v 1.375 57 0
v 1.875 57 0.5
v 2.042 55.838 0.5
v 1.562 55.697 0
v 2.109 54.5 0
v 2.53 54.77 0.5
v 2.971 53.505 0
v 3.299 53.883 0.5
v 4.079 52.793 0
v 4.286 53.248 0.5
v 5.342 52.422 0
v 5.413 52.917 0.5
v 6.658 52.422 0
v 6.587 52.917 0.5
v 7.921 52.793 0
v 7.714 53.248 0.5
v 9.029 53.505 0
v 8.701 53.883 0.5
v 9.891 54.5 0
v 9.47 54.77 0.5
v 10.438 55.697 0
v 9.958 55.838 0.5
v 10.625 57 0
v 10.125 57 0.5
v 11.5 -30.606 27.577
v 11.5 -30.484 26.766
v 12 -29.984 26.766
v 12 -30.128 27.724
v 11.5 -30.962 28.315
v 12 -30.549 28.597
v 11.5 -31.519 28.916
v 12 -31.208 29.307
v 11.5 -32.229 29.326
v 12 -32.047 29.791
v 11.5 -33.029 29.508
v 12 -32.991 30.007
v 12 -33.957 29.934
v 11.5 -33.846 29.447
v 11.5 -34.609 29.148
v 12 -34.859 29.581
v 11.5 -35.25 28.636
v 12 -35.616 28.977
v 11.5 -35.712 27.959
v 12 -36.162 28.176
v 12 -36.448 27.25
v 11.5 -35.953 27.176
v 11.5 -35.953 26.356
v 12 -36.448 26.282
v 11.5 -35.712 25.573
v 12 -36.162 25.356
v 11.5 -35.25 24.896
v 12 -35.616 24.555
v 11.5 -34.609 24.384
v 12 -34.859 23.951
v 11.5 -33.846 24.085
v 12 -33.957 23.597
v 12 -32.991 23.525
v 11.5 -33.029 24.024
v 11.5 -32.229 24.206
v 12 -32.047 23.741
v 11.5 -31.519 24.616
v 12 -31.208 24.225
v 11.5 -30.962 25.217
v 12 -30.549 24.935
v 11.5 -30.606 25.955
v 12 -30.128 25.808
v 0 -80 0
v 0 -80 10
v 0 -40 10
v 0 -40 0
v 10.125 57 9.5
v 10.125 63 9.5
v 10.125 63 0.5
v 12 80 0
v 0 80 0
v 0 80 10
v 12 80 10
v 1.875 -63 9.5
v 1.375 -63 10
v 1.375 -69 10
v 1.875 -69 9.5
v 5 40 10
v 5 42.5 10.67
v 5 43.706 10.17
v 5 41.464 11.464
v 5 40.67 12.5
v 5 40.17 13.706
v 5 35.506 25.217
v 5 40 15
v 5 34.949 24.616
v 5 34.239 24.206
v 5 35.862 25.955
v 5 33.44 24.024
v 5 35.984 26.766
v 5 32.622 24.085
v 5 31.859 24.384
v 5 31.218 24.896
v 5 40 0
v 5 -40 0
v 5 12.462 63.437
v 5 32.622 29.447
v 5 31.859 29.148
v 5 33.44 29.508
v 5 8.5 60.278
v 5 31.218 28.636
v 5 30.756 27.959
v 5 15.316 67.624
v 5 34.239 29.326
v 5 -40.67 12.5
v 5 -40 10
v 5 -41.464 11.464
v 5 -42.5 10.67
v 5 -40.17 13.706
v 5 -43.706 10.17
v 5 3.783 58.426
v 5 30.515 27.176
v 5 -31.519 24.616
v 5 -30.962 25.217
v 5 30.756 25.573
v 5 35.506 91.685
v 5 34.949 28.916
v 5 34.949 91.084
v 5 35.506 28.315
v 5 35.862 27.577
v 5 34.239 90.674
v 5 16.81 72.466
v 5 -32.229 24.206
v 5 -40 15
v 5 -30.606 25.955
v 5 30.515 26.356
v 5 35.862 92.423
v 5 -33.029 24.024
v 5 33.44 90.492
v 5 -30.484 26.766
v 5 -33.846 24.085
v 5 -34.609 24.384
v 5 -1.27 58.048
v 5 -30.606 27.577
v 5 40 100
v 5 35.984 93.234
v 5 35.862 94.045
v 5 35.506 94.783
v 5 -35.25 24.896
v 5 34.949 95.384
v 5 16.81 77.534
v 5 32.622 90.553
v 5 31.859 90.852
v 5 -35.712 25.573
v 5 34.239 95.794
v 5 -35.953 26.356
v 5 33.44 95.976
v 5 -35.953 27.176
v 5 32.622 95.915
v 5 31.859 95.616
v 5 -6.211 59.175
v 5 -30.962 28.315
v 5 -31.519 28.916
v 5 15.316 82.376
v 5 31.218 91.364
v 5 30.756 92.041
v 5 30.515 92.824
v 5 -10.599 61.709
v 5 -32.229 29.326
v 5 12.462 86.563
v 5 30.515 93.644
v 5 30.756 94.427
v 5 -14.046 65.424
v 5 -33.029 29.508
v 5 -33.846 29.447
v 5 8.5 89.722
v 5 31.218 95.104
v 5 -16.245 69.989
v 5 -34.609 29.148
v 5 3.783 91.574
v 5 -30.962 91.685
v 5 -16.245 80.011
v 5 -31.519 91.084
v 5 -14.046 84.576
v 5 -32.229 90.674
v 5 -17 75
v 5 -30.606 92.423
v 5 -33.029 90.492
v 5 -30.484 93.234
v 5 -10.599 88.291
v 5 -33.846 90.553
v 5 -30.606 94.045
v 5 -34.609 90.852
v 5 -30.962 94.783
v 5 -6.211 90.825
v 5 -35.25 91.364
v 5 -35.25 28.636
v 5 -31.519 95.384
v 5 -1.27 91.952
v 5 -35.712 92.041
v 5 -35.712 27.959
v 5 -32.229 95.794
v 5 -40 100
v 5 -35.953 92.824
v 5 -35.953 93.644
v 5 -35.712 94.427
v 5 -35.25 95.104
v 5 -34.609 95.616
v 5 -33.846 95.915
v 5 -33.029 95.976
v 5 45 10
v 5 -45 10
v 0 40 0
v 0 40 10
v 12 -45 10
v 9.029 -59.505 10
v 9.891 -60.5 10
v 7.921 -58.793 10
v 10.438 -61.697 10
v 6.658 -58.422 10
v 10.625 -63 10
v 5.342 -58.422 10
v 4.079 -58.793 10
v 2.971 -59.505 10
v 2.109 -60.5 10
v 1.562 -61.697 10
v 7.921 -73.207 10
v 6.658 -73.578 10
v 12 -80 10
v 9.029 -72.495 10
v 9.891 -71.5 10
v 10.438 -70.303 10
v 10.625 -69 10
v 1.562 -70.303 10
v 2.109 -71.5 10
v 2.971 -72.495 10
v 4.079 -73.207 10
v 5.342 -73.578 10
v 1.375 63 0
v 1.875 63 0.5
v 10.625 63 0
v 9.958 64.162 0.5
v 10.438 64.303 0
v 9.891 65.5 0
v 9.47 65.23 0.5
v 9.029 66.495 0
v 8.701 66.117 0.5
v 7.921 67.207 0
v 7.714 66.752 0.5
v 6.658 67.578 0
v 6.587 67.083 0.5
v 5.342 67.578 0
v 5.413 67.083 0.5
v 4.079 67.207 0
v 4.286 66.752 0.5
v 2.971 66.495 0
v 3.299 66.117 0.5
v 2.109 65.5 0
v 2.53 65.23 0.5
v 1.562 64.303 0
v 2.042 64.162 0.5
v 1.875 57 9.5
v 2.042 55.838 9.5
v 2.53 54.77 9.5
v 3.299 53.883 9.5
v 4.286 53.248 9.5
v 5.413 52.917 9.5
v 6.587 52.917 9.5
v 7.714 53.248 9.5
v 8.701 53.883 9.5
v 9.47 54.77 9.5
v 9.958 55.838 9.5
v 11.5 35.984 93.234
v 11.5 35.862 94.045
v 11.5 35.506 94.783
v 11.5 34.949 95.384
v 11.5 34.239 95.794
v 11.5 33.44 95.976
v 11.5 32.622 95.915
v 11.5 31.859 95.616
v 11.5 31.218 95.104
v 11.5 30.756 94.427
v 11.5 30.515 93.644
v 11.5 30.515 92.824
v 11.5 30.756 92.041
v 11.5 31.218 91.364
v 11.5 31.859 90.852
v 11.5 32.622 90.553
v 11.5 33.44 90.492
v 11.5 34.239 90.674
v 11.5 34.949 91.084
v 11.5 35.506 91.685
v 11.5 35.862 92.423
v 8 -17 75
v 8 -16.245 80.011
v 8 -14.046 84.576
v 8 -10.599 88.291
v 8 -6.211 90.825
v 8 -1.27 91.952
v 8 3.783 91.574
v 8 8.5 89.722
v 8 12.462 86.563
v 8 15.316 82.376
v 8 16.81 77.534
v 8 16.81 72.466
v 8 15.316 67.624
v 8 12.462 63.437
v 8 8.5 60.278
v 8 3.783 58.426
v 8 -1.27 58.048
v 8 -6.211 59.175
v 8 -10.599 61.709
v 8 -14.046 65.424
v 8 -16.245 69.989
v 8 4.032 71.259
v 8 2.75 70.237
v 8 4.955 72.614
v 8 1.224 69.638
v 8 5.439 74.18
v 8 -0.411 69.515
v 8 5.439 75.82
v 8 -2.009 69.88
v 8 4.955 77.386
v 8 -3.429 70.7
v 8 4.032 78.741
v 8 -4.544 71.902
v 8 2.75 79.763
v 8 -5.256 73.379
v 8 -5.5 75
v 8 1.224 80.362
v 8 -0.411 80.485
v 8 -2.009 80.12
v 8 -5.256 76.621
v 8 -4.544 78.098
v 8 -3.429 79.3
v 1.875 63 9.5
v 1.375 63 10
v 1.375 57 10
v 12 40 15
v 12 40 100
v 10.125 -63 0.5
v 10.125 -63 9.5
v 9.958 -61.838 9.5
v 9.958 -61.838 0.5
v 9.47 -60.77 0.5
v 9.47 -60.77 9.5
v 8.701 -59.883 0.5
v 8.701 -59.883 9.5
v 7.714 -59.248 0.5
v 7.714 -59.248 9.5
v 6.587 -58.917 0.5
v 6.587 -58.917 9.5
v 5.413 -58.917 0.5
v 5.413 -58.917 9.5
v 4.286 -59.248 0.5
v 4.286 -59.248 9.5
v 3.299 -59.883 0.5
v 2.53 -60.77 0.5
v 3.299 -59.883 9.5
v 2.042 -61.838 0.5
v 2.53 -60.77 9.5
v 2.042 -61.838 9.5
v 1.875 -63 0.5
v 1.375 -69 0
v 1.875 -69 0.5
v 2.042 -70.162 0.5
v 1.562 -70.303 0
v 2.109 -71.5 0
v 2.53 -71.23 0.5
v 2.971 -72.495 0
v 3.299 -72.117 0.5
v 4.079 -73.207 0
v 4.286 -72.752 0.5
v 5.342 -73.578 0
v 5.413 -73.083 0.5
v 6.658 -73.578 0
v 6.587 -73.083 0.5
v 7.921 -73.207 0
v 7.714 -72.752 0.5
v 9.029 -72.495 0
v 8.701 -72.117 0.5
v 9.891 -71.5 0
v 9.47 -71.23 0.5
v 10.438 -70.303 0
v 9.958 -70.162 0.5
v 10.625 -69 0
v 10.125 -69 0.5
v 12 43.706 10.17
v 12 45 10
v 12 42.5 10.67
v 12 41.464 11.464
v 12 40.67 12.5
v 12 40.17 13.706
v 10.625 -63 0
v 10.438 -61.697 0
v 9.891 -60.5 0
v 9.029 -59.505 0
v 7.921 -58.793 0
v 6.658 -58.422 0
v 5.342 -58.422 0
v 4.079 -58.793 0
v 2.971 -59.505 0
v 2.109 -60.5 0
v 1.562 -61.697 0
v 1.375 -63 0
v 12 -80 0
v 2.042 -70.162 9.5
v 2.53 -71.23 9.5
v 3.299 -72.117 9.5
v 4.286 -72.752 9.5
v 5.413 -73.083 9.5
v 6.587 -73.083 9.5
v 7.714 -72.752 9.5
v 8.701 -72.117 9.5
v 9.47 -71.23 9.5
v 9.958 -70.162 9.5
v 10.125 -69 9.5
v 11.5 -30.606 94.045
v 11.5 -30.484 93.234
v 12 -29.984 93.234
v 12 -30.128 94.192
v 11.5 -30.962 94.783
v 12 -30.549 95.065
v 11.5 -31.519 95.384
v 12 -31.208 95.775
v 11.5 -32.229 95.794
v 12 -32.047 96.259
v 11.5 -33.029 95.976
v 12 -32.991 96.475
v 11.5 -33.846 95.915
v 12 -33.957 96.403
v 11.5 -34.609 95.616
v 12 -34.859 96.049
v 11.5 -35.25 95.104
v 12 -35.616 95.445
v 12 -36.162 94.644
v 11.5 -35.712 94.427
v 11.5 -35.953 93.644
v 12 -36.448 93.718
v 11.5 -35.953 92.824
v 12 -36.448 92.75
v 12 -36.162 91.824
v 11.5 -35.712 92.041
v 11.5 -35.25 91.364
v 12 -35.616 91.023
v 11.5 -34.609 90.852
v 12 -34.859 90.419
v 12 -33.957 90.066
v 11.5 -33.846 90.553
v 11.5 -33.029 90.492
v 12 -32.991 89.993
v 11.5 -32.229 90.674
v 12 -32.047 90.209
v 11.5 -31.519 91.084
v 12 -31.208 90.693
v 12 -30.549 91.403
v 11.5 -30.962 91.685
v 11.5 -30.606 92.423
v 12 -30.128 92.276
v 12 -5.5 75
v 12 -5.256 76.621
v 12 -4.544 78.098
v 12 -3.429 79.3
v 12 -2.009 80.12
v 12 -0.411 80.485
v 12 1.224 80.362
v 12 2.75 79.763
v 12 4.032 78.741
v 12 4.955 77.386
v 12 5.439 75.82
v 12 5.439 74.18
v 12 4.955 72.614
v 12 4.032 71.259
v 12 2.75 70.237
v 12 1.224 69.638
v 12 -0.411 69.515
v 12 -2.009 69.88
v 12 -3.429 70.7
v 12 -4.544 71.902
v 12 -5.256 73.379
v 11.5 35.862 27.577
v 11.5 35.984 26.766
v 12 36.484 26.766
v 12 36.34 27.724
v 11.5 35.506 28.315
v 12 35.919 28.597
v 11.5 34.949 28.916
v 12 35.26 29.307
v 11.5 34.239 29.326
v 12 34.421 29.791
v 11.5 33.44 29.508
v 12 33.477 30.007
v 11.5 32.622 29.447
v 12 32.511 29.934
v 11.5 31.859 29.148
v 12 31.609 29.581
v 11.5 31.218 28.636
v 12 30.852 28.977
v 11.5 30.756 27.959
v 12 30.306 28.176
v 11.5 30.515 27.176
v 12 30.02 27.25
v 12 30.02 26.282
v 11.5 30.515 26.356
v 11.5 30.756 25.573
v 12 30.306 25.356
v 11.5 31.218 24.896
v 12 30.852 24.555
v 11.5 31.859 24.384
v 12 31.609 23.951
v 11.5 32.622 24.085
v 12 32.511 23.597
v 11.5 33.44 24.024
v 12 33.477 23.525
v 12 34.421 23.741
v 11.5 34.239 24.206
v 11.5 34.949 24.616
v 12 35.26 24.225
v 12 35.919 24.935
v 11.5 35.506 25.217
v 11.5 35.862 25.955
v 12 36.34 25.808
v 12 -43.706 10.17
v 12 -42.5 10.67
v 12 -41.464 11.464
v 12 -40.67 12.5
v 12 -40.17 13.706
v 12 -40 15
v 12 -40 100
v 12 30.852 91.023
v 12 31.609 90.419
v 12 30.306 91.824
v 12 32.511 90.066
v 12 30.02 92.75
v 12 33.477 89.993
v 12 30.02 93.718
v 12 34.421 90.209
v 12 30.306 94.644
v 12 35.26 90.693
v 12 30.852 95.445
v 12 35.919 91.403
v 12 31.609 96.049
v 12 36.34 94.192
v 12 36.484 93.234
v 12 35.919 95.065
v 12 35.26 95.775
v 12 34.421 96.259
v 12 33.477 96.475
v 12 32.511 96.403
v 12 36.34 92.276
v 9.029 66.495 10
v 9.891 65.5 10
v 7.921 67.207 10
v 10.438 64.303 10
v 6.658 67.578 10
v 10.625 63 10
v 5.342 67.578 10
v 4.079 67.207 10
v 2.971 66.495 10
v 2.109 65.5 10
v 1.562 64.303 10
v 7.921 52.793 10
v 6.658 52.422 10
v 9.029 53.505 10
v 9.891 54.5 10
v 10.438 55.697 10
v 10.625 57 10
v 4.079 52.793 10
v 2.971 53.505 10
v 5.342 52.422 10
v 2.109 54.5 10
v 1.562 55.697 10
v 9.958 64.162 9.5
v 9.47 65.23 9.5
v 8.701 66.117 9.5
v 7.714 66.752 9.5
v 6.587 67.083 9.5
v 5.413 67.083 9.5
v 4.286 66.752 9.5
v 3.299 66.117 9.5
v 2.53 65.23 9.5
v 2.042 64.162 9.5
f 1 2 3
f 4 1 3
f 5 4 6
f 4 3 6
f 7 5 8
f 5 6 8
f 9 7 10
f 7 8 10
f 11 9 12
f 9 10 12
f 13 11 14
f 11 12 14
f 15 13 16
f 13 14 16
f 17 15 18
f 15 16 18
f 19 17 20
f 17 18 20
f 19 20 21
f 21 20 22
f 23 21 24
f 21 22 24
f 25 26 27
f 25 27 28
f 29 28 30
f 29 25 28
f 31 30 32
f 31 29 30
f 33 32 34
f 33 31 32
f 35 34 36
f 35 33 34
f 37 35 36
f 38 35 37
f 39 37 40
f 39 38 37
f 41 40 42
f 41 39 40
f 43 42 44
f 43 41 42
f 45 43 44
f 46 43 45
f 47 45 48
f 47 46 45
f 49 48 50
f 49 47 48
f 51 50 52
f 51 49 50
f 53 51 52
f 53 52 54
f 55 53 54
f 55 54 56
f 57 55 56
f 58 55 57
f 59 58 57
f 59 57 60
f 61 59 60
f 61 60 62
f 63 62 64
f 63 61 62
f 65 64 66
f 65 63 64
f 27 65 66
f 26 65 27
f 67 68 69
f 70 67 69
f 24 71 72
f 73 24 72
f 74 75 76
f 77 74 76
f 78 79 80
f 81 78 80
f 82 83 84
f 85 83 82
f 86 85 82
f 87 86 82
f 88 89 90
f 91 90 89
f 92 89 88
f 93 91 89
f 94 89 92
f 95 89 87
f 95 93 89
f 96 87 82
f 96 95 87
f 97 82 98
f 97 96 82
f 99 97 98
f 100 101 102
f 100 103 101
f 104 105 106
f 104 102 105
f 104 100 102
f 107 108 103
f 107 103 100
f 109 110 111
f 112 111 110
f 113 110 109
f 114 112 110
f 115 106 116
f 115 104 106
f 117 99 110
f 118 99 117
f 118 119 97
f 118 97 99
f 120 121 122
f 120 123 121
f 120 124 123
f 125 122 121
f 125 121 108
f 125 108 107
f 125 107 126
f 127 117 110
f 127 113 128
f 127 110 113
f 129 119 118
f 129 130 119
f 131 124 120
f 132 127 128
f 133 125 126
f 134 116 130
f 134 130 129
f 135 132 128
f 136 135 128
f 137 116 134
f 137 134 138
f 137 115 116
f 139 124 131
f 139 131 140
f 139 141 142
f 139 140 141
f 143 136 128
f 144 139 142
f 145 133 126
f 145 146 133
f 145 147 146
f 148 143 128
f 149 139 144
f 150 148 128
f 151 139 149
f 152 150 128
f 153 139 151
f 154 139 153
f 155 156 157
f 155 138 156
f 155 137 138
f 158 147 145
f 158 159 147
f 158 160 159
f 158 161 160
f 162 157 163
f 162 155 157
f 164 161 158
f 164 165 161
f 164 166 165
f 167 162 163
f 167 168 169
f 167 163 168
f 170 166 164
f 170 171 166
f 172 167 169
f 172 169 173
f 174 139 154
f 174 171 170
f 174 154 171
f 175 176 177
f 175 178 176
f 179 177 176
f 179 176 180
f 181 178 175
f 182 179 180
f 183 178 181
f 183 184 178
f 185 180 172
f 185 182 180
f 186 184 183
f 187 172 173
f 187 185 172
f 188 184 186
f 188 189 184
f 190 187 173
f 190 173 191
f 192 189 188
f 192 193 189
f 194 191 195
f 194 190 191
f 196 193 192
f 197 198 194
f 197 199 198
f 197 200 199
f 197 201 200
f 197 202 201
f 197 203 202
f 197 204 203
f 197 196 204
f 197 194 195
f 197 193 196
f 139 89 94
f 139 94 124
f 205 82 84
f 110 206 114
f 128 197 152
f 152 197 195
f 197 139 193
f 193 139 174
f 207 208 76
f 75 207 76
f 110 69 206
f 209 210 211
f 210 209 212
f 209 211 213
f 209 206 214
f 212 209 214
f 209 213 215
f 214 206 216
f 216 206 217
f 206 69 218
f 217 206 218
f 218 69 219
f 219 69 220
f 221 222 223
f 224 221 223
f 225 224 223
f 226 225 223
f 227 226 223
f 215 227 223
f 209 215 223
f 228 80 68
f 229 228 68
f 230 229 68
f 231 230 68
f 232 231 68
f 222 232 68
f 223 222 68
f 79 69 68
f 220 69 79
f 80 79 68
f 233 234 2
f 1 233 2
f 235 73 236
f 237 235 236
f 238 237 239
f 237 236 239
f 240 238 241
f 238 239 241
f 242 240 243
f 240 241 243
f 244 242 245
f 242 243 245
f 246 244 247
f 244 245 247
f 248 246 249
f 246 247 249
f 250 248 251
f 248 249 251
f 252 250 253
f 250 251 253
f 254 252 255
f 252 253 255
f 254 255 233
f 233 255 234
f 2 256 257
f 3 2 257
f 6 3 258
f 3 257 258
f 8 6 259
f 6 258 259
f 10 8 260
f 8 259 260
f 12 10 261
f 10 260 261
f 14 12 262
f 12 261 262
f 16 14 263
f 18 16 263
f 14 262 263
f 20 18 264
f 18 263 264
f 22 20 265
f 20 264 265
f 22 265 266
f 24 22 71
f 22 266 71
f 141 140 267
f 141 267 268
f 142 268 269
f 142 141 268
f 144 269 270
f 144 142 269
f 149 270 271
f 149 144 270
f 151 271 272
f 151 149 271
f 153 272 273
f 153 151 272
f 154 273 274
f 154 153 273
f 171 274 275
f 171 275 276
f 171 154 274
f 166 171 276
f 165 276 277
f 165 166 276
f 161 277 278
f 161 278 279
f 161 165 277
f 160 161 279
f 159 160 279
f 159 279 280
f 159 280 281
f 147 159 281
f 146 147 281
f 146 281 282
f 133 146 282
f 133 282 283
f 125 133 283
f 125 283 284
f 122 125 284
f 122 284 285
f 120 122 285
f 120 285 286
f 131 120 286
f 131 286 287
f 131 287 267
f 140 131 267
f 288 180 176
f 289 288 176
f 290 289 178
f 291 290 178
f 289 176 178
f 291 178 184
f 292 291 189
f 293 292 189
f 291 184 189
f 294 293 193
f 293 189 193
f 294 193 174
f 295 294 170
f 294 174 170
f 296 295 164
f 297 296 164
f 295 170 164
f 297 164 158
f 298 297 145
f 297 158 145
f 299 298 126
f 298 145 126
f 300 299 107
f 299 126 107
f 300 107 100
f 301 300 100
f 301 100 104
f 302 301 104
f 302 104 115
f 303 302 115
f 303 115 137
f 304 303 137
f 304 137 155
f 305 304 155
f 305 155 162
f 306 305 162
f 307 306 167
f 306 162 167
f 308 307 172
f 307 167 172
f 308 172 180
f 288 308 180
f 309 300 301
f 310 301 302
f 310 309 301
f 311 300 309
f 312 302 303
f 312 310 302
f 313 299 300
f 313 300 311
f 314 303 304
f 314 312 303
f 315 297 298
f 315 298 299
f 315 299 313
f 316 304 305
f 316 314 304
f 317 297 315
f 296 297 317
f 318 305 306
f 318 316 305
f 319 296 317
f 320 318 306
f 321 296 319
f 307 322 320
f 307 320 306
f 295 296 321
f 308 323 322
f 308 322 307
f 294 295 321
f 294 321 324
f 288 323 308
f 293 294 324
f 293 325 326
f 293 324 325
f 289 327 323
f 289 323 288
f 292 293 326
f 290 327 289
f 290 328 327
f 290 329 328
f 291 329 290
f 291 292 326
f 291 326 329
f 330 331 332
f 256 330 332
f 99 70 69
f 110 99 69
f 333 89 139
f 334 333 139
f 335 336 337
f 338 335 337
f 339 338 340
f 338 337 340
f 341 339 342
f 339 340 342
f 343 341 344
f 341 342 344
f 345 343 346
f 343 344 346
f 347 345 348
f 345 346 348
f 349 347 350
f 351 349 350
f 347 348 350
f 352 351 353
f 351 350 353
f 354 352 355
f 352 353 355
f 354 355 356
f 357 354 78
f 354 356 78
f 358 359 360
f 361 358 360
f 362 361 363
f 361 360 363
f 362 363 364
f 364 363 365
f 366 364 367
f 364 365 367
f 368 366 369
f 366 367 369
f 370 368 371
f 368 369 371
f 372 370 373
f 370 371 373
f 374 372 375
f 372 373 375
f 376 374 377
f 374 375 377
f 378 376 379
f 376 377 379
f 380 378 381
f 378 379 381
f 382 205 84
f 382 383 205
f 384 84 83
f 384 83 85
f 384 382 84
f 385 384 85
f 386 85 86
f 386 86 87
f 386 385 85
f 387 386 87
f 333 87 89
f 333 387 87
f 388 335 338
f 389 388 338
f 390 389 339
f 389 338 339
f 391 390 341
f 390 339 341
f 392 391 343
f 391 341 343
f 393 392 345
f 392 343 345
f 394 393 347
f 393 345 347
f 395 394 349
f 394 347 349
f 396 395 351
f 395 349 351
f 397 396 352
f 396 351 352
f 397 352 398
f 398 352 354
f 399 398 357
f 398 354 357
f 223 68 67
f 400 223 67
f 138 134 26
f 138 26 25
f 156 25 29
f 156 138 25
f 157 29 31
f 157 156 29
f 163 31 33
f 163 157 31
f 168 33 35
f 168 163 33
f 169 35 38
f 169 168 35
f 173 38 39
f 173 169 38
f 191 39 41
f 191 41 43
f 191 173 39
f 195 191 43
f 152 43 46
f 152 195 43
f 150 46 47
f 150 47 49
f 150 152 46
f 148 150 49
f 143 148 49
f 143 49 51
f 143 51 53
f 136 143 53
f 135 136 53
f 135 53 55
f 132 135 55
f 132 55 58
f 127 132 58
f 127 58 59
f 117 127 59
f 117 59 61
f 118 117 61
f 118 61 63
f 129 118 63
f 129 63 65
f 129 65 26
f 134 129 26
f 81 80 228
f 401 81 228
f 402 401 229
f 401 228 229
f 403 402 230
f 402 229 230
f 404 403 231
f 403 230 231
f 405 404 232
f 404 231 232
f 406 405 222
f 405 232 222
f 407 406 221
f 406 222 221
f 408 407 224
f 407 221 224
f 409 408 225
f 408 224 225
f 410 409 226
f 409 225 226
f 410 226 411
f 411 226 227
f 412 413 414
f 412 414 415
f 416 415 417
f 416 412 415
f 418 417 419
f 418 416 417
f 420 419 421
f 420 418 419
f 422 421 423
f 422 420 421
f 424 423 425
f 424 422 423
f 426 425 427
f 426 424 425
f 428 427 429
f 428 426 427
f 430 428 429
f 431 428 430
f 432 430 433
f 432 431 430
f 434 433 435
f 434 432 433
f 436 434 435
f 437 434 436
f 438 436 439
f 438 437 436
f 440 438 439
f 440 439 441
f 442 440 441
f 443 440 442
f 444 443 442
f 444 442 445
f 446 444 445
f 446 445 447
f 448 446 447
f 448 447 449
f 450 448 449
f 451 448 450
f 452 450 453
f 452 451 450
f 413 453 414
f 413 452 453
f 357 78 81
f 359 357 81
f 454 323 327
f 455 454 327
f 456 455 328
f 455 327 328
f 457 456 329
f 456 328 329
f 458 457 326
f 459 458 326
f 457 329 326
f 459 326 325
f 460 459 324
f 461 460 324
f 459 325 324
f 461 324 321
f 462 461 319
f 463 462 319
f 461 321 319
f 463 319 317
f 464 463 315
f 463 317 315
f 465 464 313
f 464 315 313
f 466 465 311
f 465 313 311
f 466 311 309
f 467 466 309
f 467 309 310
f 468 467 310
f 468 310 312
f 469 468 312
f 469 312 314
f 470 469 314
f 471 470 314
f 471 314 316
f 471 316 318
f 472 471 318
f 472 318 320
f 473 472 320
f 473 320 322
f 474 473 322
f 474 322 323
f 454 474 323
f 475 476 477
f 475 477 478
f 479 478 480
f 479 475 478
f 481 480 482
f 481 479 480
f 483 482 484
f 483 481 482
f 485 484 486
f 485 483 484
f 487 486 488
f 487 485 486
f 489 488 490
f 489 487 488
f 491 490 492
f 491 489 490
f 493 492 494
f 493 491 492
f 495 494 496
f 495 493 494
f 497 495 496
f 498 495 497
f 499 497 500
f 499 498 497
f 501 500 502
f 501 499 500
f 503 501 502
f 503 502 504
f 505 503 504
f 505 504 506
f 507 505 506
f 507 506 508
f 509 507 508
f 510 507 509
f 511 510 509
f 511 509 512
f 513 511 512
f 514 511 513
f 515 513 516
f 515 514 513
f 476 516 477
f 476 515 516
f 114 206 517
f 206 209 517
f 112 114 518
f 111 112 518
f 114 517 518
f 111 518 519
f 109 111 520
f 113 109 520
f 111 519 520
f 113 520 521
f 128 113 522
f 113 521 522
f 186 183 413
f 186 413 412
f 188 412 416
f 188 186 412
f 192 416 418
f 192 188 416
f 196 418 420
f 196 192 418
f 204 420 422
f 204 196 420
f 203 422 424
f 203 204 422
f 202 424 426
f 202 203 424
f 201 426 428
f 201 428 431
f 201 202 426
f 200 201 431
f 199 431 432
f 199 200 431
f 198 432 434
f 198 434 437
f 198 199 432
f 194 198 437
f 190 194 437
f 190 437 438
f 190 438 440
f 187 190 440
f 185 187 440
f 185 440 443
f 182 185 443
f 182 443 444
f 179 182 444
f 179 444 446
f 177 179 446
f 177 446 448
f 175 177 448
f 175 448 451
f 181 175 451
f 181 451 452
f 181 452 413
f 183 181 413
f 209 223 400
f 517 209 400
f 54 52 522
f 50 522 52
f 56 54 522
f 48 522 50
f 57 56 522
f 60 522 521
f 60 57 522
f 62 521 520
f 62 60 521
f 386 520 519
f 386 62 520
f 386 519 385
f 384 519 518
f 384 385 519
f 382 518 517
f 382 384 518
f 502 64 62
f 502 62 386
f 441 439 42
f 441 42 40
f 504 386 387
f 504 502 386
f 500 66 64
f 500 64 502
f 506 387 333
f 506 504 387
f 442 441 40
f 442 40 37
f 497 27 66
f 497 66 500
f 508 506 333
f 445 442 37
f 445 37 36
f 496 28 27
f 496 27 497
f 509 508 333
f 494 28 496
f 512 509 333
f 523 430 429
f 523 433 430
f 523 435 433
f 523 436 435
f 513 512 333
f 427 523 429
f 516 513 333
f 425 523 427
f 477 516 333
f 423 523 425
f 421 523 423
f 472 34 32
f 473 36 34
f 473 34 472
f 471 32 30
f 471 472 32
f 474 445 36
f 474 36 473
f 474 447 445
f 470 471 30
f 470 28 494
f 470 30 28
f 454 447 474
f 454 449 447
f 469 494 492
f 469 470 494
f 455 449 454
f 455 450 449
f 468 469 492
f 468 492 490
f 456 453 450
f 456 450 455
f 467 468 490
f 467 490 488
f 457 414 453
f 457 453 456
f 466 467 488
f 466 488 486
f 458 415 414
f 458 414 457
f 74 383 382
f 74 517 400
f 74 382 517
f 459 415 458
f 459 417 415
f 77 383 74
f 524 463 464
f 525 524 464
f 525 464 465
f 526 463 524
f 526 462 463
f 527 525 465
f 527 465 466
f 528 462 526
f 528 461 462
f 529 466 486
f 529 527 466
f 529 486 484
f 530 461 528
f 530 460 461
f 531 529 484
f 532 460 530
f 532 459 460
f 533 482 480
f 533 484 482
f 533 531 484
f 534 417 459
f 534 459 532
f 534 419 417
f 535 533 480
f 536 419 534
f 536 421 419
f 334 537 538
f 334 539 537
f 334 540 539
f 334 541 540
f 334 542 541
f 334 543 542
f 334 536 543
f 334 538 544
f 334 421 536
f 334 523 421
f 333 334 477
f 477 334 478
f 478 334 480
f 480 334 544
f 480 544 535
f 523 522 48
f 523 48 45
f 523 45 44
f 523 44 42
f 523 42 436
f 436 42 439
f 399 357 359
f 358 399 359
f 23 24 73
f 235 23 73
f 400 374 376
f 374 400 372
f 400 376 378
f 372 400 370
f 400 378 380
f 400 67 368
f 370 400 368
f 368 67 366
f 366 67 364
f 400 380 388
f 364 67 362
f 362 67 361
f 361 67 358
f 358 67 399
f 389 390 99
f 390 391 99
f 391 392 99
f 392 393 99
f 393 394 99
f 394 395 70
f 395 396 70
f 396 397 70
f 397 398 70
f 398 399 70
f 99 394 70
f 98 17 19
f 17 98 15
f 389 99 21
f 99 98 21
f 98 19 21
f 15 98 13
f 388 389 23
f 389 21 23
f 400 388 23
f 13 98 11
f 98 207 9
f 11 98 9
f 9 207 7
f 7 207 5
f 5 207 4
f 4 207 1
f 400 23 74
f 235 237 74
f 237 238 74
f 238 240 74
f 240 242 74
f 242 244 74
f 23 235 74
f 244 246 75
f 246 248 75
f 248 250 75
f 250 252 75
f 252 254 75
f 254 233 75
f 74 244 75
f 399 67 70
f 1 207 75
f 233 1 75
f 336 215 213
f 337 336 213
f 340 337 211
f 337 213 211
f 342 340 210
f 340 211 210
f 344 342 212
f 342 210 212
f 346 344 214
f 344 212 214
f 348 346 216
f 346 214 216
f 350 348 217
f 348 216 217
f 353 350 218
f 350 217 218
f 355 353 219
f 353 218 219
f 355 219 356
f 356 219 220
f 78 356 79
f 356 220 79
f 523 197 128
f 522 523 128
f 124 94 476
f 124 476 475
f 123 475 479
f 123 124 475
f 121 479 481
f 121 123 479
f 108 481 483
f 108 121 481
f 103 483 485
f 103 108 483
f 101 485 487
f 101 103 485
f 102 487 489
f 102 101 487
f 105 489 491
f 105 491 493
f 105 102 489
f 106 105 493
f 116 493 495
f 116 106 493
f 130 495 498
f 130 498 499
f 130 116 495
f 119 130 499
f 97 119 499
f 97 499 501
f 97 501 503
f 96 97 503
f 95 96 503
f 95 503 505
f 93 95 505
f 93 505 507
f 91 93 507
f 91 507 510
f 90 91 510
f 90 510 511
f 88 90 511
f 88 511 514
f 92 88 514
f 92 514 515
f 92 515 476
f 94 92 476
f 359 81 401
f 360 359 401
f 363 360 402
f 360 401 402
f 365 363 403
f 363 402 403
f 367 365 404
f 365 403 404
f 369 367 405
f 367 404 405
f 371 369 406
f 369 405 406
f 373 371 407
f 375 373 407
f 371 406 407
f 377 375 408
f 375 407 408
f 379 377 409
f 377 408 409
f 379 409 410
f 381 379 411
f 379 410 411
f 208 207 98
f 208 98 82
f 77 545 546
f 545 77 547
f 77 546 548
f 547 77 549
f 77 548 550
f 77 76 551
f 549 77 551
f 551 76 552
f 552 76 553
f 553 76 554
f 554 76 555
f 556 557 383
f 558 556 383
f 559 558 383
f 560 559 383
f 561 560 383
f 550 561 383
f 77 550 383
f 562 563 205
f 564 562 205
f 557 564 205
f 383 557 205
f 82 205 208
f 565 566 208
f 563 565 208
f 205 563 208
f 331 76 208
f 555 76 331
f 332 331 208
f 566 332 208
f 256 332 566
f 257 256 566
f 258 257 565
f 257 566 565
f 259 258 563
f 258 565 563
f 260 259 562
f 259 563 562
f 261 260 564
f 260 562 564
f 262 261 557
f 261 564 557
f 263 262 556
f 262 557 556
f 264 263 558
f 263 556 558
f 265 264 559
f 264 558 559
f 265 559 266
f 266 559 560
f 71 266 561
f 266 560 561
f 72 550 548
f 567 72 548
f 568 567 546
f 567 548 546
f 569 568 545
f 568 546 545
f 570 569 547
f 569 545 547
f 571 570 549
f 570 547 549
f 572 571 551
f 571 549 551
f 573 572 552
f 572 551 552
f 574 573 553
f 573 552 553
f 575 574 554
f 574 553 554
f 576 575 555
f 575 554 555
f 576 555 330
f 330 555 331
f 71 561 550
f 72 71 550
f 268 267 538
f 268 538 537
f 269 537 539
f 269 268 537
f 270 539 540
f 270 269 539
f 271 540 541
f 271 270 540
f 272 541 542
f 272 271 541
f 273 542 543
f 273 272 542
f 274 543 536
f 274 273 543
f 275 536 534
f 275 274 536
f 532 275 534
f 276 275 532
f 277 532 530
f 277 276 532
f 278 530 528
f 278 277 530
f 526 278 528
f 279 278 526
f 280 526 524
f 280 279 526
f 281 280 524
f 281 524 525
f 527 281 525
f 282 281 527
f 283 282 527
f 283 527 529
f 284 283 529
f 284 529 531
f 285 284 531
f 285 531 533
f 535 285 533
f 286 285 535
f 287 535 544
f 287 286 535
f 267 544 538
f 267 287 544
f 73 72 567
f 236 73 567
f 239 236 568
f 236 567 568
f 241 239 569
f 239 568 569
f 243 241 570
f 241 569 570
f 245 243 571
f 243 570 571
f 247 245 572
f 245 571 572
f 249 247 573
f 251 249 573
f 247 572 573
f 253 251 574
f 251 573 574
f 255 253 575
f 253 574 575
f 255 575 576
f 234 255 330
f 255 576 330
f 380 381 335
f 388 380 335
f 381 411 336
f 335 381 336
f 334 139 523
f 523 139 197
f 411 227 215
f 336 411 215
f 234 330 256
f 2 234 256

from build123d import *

# Parameters (mm, degrees)
F0_R      = 2.75
F1_DEPTH  = 12
F3_DEPTH  = 10.001
F4_SIZE   = 0.5
F5_SIZE   = 0.5
F6_W      = 80
F6_H      = 104
F7_DEPTH  = 5
F8_R      = 17
F8_R_2    = 5.5
F9_DEPTH  = 3
F10_R     = 5
F11_DEPTH = 7.001


with BuildPart() as f1:
    # F0 (on Right) → F1 (new body)
    with BuildSketch(Plane.YZ):
        Polygon((-80, 0), (0, 0), (80, 0), (80, 10), (40, 10), (40, 100), (0, 100), (-40, 100), (-40, 10), (-80, 10), align=None)
        with Locations((-33.2340187158, 26.7659812842)):
            Circle(F0_R, mode=Mode.SUBTRACT)
        with Locations((33.2340187158, 26.7659812842)):
            Circle(F0_R, mode=Mode.SUBTRACT)
        with Locations((-33.2340187158, 93.2340187158)):
            Circle(F0_R, mode=Mode.SUBTRACT)
        with Locations((33.2340187158, 93.2340187158)):
            Circle(F0_R, mode=Mode.SUBTRACT)
    extrude(amount=F1_DEPTH)

    # F2 (on face) → F3 (cut, through all)
    with BuildSketch(Plane.XY.offset(10)):
        with BuildLine():
            Line((10.125, 57), (10.125, 63))
            ThreePointArc((10.125, 63), (6, 67.125), (1.875, 63))
            Line((1.875, 63), (1.875, 57))
            ThreePointArc((1.875, 57), (6, 52.875), (10.125, 57))
        make_face()
        with BuildLine():
            Line((10.125, -69), (10.125, -63))
            ThreePointArc((10.125, -63), (6, -58.875), (1.875, -63))
            Line((1.875, -63), (1.875, -69))
            ThreePointArc((1.875, -69), (6, -73.125), (10.125, -69))
        make_face()
    extrude(amount=-F3_DEPTH, mode=Mode.SUBTRACT)

    # F4
    f4_edges = [f1.edges().sort_by_distance(p)[0] for p in [
        (6, 52.875, 10),
        (10.125, 57, 5),
        (6, 52.875, 0),
        (1.875, 57, 5),
        (6, -58.875, 10),
        (1.875, -63, 5),
        (6, -58.875, 0),
        (10.125, -63, 5),
    ]]
    chamfer(f4_edges, length=F4_SIZE)

    # F5
    f5_edges = [f1.edges().sort_by_distance(p)[0] for p in [
        (6, -30.484019, 93.234019),
        (0, -35.984019, 93.234019),
        (12, -35.984019, 93.234019),
        (6, 35.984019, 93.234019),
        (0, 30.484019, 93.234019),
        (12, 30.484019, 93.234019),
        (6, -30.484019, 26.765981),
        (0, -35.984019, 26.765981),
        (12, -35.984019, 26.765981),
        (6, 35.984019, 26.765981),
        (0, 30.484019, 26.765981),
        (12, 30.484019, 26.765981),
    ]]
    chamfer(f5_edges, length=F5_SIZE)

    # F6 (on face) → F7 (cut)
    with BuildSketch(Plane(origin=(0, 0, 0), x_dir=(0, -1, 0), z_dir=(-1, 0, 0))):
        with Locations((0, 48)):
            Rectangle(F6_W, F6_H)
    extrude(amount=-F7_DEPTH, mode=Mode.SUBTRACT)

    # F8 (on face) → F9 (cut)
    with BuildSketch(Plane(origin=(5, 0, 0), x_dir=(0, -1, 0), z_dir=(-1, 0, 0))):
        with Locations((0, 75)):
            Circle(F8_R)
        with Locations((0, 75)):
            Circle(F8_R_2, mode=Mode.SUBTRACT)
    extrude(amount=-F9_DEPTH, mode=Mode.SUBTRACT)

    # F10
    f10_edges = [f1.edges().sort_by_distance(p)[0] for p in [
        (8.5, 40, 10),
        (8.5, -40, 10),
    ]]
    fillet(f10_edges, radius=F10_R)

    # F11 (cut, through all): a face of the model
    f11_faces = [f1.faces().sort_by_distance(p)[0] for p in [
        (5, 0, 75),
    ]]
    extrude(f11_faces, amount=-F11_DEPTH, mode=Mode.SUBTRACT)


solid = f1.part
